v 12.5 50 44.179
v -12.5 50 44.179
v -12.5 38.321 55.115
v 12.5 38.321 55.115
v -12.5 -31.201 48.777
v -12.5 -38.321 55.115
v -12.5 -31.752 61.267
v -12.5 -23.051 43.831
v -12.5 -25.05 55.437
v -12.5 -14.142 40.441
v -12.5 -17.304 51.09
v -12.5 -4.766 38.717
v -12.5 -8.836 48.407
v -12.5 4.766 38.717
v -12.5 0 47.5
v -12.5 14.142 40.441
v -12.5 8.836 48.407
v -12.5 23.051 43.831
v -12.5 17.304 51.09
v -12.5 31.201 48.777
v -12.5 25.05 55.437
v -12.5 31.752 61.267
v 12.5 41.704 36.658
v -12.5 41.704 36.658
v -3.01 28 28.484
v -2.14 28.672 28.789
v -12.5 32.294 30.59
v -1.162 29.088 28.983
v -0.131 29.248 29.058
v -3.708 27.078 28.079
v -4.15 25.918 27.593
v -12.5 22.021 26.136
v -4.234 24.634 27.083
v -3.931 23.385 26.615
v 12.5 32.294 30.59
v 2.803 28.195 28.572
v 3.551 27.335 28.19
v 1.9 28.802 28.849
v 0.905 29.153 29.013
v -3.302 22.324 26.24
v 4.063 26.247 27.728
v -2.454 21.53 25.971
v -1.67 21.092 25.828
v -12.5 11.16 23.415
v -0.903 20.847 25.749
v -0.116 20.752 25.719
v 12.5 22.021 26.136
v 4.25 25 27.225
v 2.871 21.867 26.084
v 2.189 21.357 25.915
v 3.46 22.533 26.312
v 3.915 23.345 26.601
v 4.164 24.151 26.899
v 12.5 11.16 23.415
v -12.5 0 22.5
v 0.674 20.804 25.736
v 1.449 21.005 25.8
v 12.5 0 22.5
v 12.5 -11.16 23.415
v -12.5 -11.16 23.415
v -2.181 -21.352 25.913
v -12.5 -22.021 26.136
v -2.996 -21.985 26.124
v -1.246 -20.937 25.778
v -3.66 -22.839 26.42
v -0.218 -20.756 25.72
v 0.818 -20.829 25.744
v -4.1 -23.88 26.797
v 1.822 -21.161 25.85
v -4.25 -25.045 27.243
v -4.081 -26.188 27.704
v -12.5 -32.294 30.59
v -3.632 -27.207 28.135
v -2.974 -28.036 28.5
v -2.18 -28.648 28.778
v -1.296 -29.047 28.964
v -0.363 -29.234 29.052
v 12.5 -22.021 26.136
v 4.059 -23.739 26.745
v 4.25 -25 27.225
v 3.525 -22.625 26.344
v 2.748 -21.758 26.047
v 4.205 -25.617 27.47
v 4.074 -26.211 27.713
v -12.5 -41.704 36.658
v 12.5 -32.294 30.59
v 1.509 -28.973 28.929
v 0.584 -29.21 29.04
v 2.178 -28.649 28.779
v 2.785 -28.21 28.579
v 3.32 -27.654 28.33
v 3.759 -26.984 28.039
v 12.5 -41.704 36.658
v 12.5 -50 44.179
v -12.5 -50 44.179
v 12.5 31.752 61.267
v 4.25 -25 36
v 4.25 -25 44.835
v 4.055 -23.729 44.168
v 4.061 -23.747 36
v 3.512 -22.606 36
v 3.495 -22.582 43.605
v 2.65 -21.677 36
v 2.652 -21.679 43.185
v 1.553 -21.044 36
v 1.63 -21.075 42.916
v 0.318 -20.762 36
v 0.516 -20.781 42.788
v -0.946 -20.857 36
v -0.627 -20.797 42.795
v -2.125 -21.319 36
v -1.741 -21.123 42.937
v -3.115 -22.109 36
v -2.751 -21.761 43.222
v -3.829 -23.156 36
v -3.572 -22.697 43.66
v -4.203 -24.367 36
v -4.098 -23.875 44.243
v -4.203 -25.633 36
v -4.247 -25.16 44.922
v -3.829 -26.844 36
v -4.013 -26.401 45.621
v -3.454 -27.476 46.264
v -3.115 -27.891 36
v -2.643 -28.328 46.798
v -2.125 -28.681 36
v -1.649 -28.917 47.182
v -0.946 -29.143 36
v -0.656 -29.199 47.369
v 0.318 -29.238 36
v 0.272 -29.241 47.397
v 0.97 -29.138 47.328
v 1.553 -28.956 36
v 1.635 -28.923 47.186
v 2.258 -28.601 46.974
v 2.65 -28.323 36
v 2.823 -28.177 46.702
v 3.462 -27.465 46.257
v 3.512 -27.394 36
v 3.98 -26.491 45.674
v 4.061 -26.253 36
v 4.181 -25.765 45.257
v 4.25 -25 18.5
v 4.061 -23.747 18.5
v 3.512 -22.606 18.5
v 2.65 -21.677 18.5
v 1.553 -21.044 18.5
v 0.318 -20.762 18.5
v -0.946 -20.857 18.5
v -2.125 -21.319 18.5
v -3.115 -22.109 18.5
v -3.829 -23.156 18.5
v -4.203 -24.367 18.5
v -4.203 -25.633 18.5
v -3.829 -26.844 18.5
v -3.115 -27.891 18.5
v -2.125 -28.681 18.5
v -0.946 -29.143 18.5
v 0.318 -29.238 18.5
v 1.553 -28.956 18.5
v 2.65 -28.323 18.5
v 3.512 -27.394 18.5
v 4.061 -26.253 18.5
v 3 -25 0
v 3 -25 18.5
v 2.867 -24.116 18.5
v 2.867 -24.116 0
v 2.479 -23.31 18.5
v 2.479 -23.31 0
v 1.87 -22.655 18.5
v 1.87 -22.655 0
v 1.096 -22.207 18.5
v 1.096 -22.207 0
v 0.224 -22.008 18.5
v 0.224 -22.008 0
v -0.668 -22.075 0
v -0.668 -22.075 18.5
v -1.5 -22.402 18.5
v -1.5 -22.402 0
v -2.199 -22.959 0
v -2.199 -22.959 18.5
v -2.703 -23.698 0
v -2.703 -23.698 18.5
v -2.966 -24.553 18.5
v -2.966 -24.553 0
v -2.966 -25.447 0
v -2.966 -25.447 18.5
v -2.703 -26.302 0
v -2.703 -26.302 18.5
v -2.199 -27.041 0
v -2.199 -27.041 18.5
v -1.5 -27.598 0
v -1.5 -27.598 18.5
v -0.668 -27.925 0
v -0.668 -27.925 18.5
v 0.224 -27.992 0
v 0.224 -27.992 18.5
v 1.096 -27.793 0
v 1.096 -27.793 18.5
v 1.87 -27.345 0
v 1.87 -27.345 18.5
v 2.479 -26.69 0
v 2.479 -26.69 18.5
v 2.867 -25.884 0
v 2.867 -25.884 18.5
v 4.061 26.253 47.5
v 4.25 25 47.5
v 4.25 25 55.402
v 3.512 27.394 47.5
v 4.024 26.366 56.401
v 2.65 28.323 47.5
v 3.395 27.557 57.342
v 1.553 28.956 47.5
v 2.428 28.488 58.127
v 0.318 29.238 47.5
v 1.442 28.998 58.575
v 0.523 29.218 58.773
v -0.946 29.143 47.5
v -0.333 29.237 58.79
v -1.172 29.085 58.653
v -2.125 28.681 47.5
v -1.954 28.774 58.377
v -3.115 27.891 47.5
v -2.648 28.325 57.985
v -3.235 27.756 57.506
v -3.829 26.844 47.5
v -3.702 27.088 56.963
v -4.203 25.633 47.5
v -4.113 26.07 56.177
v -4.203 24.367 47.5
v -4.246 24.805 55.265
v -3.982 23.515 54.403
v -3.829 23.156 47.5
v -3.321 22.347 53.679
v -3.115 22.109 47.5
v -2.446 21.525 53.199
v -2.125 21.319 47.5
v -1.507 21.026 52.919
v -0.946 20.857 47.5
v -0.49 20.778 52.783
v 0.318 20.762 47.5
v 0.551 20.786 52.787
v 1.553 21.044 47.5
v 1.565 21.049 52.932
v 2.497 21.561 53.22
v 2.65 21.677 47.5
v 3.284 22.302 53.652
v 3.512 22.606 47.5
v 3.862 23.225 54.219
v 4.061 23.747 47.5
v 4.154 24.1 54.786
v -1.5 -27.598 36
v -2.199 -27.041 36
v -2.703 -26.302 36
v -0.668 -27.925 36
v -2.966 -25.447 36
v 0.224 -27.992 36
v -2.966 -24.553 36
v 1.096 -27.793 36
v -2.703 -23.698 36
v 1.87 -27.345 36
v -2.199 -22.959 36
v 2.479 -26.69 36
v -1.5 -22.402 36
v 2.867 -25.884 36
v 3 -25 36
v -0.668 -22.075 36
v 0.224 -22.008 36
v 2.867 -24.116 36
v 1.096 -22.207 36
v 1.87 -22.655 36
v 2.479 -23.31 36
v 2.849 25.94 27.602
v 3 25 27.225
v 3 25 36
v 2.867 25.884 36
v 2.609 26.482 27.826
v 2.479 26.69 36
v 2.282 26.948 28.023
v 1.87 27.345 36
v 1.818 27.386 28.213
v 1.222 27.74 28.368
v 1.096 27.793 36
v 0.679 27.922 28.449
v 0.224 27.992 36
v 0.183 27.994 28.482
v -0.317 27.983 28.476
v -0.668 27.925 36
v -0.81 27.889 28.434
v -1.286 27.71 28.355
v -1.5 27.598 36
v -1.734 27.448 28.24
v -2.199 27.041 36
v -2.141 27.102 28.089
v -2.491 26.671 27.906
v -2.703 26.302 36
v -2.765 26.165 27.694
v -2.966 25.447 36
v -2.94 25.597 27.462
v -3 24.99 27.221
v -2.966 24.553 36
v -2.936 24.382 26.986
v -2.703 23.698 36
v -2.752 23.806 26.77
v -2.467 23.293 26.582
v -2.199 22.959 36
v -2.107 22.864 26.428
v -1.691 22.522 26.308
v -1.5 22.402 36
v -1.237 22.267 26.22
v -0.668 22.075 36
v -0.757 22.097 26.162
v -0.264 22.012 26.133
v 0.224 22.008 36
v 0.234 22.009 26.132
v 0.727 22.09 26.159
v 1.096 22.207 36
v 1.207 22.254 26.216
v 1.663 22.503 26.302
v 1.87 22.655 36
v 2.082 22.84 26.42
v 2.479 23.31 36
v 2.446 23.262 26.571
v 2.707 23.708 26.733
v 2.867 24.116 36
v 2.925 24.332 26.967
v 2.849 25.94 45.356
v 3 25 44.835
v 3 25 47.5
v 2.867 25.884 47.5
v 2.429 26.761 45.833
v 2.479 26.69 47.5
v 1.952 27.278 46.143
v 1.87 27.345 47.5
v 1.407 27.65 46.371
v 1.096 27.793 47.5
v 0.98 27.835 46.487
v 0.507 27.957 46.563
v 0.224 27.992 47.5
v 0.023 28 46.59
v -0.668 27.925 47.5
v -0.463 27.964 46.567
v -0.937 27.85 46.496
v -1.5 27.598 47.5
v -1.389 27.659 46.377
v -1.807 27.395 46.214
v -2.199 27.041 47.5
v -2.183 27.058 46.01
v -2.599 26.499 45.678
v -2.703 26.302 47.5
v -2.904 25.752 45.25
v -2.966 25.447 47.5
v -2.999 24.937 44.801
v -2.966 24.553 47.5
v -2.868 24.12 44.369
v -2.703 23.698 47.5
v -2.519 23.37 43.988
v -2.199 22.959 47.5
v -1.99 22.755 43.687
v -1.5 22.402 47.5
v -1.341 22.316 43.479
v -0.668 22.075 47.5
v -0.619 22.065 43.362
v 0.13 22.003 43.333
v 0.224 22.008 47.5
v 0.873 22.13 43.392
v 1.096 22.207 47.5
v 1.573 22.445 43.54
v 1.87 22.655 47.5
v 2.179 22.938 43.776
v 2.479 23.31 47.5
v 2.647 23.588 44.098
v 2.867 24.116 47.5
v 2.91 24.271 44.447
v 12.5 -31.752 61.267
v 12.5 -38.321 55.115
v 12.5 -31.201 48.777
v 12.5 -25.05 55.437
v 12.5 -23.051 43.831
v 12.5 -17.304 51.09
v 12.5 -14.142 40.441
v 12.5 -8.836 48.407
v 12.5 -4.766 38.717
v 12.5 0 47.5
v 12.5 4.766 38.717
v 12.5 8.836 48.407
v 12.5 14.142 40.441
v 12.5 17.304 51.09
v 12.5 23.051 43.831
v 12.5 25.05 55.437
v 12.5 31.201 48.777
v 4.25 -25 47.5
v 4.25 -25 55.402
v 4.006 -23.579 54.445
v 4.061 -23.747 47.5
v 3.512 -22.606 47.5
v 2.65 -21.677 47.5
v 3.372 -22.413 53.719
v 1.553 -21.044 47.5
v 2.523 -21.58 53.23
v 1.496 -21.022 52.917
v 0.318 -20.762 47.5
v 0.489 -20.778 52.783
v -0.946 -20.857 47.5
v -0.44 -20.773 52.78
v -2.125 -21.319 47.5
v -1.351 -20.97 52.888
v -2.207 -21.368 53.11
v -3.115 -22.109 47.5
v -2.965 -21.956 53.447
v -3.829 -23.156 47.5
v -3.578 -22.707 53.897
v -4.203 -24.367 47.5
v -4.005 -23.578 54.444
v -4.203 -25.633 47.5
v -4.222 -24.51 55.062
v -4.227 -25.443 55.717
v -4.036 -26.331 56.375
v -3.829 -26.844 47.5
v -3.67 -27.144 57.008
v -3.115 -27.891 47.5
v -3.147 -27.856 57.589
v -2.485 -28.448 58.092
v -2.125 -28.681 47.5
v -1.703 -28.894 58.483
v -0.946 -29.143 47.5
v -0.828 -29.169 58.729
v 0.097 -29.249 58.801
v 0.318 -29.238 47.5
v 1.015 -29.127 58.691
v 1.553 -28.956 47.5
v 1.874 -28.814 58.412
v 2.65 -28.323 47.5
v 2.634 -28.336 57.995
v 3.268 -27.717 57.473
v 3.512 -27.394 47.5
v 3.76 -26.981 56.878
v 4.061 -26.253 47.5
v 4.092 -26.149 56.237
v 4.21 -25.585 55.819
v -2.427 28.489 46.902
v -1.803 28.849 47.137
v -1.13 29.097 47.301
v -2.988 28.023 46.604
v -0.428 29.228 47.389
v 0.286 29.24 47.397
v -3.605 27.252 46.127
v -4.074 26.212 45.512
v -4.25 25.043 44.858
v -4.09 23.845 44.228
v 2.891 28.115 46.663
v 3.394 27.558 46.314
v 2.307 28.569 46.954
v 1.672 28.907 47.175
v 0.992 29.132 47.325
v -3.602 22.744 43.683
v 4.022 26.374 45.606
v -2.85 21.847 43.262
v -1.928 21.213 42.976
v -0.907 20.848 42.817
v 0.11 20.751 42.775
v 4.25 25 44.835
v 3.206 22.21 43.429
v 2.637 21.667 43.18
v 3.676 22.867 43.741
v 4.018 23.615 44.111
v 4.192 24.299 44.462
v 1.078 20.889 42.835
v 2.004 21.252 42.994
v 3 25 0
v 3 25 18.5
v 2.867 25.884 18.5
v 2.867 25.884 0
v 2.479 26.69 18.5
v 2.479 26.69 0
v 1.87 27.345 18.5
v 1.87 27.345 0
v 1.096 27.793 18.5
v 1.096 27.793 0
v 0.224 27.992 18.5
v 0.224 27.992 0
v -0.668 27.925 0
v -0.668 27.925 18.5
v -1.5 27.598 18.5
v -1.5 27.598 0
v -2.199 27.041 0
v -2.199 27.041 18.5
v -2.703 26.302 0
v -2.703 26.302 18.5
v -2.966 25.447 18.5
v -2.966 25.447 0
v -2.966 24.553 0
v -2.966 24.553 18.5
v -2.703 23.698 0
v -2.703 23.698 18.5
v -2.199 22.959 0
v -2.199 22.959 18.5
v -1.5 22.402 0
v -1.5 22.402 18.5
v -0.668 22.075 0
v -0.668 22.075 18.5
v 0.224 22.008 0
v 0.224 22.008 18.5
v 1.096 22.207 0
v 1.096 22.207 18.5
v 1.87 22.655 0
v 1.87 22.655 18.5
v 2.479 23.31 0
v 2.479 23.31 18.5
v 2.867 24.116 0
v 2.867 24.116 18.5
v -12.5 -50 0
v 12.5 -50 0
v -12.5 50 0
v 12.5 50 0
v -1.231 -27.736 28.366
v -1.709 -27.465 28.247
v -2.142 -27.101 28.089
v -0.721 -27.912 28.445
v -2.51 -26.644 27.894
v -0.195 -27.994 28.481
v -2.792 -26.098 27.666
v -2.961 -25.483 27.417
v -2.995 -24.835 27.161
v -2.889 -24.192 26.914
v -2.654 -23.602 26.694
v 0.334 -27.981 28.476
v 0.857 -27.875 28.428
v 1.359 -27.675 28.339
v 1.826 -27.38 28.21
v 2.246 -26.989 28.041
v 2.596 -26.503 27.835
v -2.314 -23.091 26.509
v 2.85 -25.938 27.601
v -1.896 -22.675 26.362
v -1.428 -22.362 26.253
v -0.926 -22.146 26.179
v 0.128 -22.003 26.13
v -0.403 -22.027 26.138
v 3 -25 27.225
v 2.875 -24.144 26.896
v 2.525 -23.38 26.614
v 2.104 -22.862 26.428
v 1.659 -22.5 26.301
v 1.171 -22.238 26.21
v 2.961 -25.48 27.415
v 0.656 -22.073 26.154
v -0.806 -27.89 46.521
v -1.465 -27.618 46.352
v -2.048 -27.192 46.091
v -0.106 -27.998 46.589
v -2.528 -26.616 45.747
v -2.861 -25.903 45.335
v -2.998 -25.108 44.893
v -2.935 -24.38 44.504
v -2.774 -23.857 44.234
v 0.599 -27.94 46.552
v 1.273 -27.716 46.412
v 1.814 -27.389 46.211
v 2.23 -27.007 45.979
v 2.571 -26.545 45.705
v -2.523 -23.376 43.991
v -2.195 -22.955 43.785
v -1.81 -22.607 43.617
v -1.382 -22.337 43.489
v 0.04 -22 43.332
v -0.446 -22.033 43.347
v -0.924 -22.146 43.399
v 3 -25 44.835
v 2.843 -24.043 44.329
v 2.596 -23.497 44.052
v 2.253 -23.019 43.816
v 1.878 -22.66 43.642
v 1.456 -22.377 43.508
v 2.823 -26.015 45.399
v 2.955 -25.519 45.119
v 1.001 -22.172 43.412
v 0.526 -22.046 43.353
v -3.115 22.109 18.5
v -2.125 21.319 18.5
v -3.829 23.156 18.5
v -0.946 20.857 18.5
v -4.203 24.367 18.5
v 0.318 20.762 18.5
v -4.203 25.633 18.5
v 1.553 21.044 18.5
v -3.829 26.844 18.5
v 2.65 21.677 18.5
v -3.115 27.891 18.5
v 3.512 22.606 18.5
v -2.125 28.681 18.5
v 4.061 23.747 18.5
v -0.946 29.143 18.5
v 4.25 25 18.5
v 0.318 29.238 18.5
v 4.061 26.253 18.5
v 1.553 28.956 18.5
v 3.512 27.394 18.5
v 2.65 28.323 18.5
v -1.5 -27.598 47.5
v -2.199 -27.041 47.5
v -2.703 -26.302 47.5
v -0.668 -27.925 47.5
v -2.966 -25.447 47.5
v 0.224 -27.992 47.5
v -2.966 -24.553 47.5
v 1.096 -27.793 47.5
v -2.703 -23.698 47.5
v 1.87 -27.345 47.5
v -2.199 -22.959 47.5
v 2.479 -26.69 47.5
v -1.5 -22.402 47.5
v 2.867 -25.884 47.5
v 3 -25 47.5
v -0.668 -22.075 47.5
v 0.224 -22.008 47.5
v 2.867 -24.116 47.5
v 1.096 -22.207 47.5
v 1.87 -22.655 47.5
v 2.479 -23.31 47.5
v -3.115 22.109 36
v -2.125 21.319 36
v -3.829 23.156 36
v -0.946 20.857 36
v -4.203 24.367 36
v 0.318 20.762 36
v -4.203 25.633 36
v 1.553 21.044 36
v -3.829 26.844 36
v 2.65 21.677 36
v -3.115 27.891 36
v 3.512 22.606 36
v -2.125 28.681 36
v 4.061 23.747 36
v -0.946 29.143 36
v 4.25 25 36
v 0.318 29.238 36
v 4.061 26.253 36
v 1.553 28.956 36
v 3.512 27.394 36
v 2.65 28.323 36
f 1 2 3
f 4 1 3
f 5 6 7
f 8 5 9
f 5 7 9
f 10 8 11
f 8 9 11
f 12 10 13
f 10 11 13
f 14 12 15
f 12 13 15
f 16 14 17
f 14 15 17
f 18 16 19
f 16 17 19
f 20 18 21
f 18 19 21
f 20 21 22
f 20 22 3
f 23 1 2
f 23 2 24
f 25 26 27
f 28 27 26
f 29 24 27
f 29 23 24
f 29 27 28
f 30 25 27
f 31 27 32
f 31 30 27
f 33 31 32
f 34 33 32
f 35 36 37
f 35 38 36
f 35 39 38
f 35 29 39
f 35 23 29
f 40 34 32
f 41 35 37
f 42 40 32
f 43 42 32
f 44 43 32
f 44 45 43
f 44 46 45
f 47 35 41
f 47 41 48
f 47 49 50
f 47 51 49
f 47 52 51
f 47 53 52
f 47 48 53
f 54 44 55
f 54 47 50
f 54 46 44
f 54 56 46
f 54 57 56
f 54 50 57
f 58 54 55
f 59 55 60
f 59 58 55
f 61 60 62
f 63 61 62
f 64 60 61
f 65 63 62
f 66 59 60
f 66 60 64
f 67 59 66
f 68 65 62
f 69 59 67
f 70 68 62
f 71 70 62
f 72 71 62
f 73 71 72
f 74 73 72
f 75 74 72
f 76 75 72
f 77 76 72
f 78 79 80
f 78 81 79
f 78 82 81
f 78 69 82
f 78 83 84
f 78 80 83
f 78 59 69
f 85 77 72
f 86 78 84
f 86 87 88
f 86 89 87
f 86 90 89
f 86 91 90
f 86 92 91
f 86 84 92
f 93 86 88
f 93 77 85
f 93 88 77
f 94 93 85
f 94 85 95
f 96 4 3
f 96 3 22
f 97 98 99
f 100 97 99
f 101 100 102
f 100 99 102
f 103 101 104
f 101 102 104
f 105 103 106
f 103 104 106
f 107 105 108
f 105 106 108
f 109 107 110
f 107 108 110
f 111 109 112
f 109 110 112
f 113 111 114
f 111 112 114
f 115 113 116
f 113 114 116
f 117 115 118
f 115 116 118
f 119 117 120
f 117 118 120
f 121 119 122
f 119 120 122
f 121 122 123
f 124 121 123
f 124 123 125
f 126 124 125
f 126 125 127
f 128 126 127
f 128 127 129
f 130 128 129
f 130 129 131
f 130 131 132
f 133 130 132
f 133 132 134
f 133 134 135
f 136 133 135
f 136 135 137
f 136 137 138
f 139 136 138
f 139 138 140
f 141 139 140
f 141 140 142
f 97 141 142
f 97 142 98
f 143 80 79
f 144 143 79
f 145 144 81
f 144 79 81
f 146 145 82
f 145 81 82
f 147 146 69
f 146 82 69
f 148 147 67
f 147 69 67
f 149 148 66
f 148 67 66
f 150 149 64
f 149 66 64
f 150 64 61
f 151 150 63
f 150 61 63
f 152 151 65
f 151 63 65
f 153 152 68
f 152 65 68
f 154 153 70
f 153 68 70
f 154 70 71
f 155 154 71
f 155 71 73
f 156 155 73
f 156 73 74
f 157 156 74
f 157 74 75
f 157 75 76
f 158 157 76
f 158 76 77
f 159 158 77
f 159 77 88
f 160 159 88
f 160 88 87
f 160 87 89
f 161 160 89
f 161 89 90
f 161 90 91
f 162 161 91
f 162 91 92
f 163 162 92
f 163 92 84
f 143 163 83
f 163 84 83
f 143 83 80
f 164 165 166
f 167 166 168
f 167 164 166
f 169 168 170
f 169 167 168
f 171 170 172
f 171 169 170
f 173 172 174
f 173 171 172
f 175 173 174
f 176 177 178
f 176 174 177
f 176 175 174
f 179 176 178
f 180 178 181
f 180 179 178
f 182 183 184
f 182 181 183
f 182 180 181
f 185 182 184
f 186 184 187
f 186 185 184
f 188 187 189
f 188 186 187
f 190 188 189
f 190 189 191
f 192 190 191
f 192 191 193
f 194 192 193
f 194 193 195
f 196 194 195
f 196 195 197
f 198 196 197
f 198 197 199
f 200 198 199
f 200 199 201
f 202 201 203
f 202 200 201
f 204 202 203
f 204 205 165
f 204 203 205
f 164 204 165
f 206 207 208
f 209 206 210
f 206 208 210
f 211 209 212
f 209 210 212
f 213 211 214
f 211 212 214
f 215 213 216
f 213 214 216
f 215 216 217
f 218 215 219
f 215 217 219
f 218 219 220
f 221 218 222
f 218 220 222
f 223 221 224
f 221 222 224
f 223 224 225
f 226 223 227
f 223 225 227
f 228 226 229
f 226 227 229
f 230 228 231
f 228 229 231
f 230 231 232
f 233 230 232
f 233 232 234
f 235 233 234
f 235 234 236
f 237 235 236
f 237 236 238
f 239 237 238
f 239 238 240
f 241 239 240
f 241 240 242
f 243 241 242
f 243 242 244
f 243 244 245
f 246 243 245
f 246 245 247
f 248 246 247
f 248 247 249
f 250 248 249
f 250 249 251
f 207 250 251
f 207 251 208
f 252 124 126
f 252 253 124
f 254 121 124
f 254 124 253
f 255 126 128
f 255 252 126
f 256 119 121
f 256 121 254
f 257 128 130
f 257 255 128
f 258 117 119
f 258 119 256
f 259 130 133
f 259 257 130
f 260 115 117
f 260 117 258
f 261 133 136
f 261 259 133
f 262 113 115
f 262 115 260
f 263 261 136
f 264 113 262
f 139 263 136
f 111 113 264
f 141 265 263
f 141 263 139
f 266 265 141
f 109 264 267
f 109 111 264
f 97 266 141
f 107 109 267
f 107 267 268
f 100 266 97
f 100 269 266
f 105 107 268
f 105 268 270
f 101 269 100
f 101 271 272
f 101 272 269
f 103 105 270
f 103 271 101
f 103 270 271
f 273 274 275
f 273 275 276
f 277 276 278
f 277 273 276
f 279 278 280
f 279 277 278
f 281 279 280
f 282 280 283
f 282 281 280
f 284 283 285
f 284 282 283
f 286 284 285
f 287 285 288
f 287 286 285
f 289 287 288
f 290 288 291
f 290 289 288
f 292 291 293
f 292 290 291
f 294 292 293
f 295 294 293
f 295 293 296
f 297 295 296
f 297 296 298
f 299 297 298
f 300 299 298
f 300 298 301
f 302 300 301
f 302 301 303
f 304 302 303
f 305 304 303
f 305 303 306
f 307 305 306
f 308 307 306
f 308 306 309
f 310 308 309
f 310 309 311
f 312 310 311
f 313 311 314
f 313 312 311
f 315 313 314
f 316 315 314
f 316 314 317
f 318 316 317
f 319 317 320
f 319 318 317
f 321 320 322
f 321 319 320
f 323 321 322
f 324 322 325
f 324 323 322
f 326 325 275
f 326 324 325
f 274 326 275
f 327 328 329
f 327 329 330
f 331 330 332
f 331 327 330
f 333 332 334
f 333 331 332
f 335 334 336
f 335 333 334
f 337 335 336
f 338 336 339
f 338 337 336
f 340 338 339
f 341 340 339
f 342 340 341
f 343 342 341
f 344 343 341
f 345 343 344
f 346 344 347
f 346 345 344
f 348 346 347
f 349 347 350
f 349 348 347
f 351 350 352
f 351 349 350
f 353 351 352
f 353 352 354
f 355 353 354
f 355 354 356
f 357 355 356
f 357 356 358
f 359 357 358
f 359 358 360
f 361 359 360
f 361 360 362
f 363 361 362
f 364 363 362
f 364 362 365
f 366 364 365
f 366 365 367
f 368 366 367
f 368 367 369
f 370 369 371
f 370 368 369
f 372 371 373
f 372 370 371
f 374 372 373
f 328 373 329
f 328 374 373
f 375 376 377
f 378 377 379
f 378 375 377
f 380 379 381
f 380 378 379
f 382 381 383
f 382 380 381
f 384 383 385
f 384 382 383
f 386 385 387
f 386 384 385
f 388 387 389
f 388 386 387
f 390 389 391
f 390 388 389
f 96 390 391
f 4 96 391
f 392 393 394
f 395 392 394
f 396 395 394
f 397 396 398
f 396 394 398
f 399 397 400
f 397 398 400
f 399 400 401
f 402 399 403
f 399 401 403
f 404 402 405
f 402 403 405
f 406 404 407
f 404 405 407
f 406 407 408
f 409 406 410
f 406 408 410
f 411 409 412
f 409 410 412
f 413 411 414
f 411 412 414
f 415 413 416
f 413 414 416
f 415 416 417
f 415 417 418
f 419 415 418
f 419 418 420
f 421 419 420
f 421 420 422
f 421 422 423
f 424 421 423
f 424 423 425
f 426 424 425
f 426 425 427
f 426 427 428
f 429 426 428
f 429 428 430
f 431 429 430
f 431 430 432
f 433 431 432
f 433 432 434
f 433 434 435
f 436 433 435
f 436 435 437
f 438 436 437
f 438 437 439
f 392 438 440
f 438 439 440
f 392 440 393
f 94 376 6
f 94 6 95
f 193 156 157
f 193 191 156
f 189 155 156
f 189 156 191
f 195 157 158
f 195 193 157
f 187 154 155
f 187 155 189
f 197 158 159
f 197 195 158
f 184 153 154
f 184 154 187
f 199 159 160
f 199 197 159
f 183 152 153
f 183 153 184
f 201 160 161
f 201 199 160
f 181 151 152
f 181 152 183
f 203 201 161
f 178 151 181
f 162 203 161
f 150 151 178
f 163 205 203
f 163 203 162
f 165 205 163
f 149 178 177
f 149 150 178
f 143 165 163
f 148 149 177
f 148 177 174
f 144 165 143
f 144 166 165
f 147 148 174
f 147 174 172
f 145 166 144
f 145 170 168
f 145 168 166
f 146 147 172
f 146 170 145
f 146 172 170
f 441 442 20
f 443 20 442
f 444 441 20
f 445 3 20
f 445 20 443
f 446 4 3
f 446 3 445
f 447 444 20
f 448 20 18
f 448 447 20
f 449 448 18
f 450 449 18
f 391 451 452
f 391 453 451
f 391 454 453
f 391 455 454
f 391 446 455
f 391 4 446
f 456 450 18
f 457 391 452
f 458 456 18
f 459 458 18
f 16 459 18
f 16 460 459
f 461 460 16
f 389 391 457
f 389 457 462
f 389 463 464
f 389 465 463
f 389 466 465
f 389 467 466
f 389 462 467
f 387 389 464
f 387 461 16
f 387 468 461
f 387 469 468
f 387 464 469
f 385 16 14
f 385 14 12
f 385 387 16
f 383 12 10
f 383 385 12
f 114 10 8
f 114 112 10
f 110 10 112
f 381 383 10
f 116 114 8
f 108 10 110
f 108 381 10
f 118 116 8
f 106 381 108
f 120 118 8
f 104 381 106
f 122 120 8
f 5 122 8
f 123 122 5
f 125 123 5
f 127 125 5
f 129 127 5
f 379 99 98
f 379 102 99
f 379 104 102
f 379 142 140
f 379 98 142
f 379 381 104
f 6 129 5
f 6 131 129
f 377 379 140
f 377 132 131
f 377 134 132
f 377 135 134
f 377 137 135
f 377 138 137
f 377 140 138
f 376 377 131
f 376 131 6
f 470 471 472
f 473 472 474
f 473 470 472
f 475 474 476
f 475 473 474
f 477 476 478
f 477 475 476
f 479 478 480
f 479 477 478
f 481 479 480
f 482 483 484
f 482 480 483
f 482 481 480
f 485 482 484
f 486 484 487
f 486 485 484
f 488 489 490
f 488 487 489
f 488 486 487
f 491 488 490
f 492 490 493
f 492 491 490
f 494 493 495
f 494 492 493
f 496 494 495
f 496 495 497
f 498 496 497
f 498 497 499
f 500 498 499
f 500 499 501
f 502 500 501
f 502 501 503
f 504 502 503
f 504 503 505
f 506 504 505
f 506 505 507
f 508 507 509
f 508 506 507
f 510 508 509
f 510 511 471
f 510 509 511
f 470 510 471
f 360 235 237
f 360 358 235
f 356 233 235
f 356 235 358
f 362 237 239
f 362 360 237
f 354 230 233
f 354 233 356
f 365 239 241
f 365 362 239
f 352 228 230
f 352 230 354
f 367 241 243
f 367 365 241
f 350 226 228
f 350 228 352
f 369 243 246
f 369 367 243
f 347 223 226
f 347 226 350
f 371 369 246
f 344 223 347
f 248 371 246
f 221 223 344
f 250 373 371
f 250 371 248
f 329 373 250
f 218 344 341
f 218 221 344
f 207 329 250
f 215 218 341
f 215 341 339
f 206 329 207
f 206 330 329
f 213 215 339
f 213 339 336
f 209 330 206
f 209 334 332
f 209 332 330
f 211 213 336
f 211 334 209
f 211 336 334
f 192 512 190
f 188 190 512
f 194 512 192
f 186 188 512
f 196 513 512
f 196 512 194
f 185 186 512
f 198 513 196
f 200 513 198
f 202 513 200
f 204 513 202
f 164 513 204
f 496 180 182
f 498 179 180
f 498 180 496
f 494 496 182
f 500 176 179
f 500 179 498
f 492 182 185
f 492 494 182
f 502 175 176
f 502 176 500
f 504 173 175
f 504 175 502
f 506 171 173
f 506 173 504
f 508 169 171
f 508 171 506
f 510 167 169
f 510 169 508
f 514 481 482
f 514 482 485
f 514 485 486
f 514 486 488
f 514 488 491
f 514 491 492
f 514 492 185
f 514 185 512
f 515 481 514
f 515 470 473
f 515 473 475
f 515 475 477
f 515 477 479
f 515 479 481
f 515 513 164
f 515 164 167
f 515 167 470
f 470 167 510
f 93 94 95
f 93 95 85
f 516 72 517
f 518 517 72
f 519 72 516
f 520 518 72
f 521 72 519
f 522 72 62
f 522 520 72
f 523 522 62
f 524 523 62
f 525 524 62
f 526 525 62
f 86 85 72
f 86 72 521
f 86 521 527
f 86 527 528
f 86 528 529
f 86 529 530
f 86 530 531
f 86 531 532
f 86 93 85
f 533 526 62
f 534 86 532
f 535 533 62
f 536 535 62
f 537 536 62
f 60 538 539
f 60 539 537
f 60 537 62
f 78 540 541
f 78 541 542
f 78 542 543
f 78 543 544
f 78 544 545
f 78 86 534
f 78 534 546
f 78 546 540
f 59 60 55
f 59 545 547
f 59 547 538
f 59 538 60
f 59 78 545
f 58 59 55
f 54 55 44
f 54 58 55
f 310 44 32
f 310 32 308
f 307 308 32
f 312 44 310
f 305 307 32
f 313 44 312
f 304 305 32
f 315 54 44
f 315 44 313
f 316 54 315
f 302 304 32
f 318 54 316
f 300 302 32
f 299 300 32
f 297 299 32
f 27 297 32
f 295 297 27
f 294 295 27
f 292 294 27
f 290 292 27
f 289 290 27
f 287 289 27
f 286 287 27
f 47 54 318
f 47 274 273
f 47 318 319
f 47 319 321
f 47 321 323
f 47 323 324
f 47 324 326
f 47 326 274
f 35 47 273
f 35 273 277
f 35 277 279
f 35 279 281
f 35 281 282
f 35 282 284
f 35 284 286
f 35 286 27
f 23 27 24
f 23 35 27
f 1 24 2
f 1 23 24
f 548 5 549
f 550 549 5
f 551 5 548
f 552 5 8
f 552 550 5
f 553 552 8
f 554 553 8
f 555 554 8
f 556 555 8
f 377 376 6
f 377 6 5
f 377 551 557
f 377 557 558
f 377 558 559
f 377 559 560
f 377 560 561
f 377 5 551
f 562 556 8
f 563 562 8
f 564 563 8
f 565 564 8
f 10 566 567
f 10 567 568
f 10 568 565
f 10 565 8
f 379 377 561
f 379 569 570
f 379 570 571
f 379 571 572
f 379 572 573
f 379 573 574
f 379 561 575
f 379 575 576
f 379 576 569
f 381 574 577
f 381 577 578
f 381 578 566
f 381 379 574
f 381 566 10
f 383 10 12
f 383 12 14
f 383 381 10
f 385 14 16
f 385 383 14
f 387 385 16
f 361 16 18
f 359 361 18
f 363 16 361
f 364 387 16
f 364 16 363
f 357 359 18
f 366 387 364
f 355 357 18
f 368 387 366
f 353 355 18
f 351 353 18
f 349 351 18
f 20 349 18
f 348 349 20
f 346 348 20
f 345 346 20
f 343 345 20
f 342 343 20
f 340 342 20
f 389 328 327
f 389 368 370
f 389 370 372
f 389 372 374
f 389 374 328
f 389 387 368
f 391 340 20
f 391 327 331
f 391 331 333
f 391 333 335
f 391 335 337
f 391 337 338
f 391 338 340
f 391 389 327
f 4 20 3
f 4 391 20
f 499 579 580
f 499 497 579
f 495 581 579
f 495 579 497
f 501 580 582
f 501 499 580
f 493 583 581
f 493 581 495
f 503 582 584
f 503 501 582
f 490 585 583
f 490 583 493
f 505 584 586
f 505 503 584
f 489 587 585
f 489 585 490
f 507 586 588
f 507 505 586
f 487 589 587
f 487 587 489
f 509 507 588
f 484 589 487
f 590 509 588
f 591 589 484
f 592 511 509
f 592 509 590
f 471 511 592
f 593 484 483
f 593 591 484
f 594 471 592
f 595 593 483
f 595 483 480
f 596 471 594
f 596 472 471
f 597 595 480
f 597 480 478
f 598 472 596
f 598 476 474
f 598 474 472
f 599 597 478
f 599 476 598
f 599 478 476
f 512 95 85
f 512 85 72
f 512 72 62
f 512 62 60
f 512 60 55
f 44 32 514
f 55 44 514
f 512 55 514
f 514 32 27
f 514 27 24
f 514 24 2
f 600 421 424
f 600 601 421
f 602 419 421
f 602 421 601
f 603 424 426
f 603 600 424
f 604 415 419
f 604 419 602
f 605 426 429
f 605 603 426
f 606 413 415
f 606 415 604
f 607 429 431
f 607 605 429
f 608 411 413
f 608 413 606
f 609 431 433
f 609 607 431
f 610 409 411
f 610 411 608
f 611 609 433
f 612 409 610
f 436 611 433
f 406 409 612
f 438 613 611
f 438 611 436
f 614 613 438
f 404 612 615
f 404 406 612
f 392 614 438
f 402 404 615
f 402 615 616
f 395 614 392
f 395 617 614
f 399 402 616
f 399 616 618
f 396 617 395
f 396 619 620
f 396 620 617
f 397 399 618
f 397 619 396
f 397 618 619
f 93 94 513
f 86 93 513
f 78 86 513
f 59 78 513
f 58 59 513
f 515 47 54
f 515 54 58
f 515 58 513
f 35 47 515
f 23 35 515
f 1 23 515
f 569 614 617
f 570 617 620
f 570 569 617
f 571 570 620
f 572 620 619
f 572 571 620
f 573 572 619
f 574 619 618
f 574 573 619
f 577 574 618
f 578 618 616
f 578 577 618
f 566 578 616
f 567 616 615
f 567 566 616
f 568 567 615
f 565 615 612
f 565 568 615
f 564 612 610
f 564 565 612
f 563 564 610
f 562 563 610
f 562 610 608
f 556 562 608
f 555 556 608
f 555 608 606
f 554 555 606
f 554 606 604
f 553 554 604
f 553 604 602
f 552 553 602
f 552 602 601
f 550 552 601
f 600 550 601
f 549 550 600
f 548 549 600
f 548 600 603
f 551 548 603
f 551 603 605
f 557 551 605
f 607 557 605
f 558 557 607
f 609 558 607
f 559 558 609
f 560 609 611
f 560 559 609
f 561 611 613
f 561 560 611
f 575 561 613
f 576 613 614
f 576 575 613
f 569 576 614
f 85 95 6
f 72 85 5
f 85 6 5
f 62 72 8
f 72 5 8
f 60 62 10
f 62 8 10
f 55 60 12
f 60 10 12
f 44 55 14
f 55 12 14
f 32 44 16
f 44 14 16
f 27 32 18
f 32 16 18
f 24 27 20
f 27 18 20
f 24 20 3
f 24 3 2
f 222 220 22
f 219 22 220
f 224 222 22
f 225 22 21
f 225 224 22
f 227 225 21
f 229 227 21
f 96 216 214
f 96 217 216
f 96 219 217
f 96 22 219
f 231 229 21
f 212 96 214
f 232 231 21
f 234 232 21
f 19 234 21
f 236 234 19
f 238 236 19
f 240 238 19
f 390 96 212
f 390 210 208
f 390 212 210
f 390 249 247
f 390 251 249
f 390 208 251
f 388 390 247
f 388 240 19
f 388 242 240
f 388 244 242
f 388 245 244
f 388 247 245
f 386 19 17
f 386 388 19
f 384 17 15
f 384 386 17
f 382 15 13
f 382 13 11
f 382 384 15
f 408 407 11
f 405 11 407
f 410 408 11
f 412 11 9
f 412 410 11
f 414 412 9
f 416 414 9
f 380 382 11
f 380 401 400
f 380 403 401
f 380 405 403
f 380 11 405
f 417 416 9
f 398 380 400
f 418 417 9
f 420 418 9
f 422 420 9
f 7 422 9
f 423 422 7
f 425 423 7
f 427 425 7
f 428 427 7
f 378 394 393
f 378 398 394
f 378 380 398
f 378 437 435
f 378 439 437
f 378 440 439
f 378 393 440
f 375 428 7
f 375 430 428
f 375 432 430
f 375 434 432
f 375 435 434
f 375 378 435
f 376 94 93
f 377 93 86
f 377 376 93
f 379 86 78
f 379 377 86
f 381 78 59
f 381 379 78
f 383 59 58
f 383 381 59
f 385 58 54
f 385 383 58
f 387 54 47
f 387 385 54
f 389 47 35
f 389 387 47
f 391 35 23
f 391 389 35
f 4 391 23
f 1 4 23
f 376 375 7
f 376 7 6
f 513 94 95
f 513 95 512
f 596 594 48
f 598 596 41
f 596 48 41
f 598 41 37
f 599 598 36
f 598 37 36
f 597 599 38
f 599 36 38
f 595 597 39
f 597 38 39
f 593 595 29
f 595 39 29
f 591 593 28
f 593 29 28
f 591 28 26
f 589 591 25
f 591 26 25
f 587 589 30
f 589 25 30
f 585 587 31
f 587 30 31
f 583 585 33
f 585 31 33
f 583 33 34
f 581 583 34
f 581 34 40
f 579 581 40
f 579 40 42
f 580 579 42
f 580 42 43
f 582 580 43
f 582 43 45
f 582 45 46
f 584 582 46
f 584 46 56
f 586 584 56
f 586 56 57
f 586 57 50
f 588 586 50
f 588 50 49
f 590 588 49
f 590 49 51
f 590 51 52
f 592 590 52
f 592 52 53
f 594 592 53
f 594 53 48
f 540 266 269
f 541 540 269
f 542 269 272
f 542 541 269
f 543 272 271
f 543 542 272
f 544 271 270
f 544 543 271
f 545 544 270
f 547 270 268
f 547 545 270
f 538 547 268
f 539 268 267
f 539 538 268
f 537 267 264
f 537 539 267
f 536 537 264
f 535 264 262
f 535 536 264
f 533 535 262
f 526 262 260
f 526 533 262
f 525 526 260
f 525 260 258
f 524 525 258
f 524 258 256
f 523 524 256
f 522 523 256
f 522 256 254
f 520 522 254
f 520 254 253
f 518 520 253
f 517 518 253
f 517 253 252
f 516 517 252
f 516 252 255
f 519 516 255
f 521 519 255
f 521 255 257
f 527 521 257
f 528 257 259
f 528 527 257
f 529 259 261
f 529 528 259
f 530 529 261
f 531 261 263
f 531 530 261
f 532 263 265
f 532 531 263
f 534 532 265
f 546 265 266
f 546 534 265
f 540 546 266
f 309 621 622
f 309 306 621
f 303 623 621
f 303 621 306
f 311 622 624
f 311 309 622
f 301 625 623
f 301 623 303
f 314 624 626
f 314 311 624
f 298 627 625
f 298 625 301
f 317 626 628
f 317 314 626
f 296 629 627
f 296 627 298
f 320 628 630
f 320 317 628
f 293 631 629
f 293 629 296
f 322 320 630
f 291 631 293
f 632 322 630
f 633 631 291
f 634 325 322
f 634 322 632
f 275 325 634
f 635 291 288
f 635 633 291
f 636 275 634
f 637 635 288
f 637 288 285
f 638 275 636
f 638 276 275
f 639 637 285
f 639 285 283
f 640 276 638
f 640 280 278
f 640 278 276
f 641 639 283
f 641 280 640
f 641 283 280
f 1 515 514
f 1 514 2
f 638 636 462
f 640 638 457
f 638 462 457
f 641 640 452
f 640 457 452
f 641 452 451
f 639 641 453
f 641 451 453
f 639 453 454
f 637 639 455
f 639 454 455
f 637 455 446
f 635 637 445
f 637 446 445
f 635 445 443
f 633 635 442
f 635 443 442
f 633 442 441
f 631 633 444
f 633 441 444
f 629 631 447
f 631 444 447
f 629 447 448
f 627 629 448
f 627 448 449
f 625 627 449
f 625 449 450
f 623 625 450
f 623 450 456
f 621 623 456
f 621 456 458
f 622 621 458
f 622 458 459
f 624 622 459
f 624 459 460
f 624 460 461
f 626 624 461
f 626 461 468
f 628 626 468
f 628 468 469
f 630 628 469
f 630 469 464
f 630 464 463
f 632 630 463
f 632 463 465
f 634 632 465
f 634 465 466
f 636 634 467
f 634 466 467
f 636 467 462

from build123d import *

# Parameters (mm, degrees)
F3_DEPTH  = 25
F4_DEPTH  = 25
F5_DEPTH  = 25
F0_R      = 3
F6_DEPTH  = 61.2676580964
F8_R      = 4.25
F9_DEPTH  = 22.5
F10_DEPTH = 34
F11_DEPTH = 51.5


with BuildPart() as f3:
    # F2 (on plane+point) → F3 (new body)
    with BuildSketch(Plane.YZ.offset(12.5)):
        with BuildLine():
            Line((-50, 0), (50, 0))
            Line((50, 0), (50, 44.1785305656))
            ThreePointArc((50, 44.1785305656), (0, 22.5), (-50, 44.1785305656))
            Line((-50, 44.1785305656), (-50, 0))
        make_face()
    extrude(amount=-F3_DEPTH)


with BuildPart() as f4:
    # F2 (on plane+point) → F4 (new body)
    with BuildSketch(Plane.YZ.offset(12.5)):
        with BuildLine():
            ThreePointArc((-50, 44.1785305656), (0, 22.5), (50, 44.1785305656))
            Line((50, 44.1785305656), (38.3211678832, 55.1149321853))
            ThreePointArc((38.3211678832, 55.1149321853), (0, 38.5), (-38.3211678832, 55.1149321853))
            Line((-38.3211678832, 55.1149321853), (-50, 44.1785305656))
        make_face()
    extrude(amount=-F4_DEPTH)


with BuildPart() as f5:
    # F2 (on plane+point) → F5 (new body)
    with BuildSketch(Plane.YZ.offset(12.5)):
        with BuildLine():
            ThreePointArc((-38.3211678832, 55.1149321853), (0, 38.5), (38.3211678832, 55.1149321853))
            Line((38.3211678832, 55.1149321853), (31.7518248175, 61.2666580964))
            ThreePointArc((31.7518248175, 61.2666580964), (0, 47.5), (-31.7518248175, 61.2666580964))
            Line((-31.7518248175, 61.2666580964), (-38.3211678832, 55.1149321853))
        make_face()
    extrude(amount=-F5_DEPTH)


with BuildPart() as f6_tool:
    # F0 (on Top) → F6 (new body, through all)
    with BuildSketch(Plane.XY):
        with Locations((0, -25)):
            Circle(F0_R)
        with Locations((0, 25)):
            Circle(F0_R)
    extrude(amount=F6_DEPTH)


with BuildPart() as f3_1:
    add(f3.part)

    # F6: cut by f6_tool
    add(f6_tool.part, mode=Mode.SUBTRACT)

    # F8 (on offset) → F11 (cut)
    with BuildSketch(Plane.XY.offset(70)):
        with Locations((0, 25)):
            Circle(F8_R)
        with Locations((0, -25)):
            Circle(F8_R)
    extrude(amount=-F11_DEPTH, mode=Mode.SUBTRACT)


with BuildPart() as f4_1:
    add(f4.part)

    # F6: cut by f6_tool
    add(f6_tool.part, mode=Mode.SUBTRACT)

    # F8 (on offset) → F10 (cut)
    with BuildSketch(Plane.XY.offset(70)):
        with Locations((0, -25)):
            Circle(F8_R)
        with Locations((0, 25)):
            Circle(F8_R)
    extrude(amount=-F10_DEPTH, mode=Mode.SUBTRACT)


with BuildPart() as f5_1:
    add(f5.part)

    # F6: cut by f6_tool
    add(f6_tool.part, mode=Mode.SUBTRACT)

    # F8 (on offset) → F9 (cut)
    with BuildSketch(Plane.XY.offset(70)):
        with Locations((0, -25)):
            Circle(F8_R)
        with Locations((0, 25)):
            Circle(F8_R)
    extrude(amount=-F9_DEPTH, mode=Mode.SUBTRACT)


solid = Compound([f3_1.part, f4_1.part, f5_1.part])
